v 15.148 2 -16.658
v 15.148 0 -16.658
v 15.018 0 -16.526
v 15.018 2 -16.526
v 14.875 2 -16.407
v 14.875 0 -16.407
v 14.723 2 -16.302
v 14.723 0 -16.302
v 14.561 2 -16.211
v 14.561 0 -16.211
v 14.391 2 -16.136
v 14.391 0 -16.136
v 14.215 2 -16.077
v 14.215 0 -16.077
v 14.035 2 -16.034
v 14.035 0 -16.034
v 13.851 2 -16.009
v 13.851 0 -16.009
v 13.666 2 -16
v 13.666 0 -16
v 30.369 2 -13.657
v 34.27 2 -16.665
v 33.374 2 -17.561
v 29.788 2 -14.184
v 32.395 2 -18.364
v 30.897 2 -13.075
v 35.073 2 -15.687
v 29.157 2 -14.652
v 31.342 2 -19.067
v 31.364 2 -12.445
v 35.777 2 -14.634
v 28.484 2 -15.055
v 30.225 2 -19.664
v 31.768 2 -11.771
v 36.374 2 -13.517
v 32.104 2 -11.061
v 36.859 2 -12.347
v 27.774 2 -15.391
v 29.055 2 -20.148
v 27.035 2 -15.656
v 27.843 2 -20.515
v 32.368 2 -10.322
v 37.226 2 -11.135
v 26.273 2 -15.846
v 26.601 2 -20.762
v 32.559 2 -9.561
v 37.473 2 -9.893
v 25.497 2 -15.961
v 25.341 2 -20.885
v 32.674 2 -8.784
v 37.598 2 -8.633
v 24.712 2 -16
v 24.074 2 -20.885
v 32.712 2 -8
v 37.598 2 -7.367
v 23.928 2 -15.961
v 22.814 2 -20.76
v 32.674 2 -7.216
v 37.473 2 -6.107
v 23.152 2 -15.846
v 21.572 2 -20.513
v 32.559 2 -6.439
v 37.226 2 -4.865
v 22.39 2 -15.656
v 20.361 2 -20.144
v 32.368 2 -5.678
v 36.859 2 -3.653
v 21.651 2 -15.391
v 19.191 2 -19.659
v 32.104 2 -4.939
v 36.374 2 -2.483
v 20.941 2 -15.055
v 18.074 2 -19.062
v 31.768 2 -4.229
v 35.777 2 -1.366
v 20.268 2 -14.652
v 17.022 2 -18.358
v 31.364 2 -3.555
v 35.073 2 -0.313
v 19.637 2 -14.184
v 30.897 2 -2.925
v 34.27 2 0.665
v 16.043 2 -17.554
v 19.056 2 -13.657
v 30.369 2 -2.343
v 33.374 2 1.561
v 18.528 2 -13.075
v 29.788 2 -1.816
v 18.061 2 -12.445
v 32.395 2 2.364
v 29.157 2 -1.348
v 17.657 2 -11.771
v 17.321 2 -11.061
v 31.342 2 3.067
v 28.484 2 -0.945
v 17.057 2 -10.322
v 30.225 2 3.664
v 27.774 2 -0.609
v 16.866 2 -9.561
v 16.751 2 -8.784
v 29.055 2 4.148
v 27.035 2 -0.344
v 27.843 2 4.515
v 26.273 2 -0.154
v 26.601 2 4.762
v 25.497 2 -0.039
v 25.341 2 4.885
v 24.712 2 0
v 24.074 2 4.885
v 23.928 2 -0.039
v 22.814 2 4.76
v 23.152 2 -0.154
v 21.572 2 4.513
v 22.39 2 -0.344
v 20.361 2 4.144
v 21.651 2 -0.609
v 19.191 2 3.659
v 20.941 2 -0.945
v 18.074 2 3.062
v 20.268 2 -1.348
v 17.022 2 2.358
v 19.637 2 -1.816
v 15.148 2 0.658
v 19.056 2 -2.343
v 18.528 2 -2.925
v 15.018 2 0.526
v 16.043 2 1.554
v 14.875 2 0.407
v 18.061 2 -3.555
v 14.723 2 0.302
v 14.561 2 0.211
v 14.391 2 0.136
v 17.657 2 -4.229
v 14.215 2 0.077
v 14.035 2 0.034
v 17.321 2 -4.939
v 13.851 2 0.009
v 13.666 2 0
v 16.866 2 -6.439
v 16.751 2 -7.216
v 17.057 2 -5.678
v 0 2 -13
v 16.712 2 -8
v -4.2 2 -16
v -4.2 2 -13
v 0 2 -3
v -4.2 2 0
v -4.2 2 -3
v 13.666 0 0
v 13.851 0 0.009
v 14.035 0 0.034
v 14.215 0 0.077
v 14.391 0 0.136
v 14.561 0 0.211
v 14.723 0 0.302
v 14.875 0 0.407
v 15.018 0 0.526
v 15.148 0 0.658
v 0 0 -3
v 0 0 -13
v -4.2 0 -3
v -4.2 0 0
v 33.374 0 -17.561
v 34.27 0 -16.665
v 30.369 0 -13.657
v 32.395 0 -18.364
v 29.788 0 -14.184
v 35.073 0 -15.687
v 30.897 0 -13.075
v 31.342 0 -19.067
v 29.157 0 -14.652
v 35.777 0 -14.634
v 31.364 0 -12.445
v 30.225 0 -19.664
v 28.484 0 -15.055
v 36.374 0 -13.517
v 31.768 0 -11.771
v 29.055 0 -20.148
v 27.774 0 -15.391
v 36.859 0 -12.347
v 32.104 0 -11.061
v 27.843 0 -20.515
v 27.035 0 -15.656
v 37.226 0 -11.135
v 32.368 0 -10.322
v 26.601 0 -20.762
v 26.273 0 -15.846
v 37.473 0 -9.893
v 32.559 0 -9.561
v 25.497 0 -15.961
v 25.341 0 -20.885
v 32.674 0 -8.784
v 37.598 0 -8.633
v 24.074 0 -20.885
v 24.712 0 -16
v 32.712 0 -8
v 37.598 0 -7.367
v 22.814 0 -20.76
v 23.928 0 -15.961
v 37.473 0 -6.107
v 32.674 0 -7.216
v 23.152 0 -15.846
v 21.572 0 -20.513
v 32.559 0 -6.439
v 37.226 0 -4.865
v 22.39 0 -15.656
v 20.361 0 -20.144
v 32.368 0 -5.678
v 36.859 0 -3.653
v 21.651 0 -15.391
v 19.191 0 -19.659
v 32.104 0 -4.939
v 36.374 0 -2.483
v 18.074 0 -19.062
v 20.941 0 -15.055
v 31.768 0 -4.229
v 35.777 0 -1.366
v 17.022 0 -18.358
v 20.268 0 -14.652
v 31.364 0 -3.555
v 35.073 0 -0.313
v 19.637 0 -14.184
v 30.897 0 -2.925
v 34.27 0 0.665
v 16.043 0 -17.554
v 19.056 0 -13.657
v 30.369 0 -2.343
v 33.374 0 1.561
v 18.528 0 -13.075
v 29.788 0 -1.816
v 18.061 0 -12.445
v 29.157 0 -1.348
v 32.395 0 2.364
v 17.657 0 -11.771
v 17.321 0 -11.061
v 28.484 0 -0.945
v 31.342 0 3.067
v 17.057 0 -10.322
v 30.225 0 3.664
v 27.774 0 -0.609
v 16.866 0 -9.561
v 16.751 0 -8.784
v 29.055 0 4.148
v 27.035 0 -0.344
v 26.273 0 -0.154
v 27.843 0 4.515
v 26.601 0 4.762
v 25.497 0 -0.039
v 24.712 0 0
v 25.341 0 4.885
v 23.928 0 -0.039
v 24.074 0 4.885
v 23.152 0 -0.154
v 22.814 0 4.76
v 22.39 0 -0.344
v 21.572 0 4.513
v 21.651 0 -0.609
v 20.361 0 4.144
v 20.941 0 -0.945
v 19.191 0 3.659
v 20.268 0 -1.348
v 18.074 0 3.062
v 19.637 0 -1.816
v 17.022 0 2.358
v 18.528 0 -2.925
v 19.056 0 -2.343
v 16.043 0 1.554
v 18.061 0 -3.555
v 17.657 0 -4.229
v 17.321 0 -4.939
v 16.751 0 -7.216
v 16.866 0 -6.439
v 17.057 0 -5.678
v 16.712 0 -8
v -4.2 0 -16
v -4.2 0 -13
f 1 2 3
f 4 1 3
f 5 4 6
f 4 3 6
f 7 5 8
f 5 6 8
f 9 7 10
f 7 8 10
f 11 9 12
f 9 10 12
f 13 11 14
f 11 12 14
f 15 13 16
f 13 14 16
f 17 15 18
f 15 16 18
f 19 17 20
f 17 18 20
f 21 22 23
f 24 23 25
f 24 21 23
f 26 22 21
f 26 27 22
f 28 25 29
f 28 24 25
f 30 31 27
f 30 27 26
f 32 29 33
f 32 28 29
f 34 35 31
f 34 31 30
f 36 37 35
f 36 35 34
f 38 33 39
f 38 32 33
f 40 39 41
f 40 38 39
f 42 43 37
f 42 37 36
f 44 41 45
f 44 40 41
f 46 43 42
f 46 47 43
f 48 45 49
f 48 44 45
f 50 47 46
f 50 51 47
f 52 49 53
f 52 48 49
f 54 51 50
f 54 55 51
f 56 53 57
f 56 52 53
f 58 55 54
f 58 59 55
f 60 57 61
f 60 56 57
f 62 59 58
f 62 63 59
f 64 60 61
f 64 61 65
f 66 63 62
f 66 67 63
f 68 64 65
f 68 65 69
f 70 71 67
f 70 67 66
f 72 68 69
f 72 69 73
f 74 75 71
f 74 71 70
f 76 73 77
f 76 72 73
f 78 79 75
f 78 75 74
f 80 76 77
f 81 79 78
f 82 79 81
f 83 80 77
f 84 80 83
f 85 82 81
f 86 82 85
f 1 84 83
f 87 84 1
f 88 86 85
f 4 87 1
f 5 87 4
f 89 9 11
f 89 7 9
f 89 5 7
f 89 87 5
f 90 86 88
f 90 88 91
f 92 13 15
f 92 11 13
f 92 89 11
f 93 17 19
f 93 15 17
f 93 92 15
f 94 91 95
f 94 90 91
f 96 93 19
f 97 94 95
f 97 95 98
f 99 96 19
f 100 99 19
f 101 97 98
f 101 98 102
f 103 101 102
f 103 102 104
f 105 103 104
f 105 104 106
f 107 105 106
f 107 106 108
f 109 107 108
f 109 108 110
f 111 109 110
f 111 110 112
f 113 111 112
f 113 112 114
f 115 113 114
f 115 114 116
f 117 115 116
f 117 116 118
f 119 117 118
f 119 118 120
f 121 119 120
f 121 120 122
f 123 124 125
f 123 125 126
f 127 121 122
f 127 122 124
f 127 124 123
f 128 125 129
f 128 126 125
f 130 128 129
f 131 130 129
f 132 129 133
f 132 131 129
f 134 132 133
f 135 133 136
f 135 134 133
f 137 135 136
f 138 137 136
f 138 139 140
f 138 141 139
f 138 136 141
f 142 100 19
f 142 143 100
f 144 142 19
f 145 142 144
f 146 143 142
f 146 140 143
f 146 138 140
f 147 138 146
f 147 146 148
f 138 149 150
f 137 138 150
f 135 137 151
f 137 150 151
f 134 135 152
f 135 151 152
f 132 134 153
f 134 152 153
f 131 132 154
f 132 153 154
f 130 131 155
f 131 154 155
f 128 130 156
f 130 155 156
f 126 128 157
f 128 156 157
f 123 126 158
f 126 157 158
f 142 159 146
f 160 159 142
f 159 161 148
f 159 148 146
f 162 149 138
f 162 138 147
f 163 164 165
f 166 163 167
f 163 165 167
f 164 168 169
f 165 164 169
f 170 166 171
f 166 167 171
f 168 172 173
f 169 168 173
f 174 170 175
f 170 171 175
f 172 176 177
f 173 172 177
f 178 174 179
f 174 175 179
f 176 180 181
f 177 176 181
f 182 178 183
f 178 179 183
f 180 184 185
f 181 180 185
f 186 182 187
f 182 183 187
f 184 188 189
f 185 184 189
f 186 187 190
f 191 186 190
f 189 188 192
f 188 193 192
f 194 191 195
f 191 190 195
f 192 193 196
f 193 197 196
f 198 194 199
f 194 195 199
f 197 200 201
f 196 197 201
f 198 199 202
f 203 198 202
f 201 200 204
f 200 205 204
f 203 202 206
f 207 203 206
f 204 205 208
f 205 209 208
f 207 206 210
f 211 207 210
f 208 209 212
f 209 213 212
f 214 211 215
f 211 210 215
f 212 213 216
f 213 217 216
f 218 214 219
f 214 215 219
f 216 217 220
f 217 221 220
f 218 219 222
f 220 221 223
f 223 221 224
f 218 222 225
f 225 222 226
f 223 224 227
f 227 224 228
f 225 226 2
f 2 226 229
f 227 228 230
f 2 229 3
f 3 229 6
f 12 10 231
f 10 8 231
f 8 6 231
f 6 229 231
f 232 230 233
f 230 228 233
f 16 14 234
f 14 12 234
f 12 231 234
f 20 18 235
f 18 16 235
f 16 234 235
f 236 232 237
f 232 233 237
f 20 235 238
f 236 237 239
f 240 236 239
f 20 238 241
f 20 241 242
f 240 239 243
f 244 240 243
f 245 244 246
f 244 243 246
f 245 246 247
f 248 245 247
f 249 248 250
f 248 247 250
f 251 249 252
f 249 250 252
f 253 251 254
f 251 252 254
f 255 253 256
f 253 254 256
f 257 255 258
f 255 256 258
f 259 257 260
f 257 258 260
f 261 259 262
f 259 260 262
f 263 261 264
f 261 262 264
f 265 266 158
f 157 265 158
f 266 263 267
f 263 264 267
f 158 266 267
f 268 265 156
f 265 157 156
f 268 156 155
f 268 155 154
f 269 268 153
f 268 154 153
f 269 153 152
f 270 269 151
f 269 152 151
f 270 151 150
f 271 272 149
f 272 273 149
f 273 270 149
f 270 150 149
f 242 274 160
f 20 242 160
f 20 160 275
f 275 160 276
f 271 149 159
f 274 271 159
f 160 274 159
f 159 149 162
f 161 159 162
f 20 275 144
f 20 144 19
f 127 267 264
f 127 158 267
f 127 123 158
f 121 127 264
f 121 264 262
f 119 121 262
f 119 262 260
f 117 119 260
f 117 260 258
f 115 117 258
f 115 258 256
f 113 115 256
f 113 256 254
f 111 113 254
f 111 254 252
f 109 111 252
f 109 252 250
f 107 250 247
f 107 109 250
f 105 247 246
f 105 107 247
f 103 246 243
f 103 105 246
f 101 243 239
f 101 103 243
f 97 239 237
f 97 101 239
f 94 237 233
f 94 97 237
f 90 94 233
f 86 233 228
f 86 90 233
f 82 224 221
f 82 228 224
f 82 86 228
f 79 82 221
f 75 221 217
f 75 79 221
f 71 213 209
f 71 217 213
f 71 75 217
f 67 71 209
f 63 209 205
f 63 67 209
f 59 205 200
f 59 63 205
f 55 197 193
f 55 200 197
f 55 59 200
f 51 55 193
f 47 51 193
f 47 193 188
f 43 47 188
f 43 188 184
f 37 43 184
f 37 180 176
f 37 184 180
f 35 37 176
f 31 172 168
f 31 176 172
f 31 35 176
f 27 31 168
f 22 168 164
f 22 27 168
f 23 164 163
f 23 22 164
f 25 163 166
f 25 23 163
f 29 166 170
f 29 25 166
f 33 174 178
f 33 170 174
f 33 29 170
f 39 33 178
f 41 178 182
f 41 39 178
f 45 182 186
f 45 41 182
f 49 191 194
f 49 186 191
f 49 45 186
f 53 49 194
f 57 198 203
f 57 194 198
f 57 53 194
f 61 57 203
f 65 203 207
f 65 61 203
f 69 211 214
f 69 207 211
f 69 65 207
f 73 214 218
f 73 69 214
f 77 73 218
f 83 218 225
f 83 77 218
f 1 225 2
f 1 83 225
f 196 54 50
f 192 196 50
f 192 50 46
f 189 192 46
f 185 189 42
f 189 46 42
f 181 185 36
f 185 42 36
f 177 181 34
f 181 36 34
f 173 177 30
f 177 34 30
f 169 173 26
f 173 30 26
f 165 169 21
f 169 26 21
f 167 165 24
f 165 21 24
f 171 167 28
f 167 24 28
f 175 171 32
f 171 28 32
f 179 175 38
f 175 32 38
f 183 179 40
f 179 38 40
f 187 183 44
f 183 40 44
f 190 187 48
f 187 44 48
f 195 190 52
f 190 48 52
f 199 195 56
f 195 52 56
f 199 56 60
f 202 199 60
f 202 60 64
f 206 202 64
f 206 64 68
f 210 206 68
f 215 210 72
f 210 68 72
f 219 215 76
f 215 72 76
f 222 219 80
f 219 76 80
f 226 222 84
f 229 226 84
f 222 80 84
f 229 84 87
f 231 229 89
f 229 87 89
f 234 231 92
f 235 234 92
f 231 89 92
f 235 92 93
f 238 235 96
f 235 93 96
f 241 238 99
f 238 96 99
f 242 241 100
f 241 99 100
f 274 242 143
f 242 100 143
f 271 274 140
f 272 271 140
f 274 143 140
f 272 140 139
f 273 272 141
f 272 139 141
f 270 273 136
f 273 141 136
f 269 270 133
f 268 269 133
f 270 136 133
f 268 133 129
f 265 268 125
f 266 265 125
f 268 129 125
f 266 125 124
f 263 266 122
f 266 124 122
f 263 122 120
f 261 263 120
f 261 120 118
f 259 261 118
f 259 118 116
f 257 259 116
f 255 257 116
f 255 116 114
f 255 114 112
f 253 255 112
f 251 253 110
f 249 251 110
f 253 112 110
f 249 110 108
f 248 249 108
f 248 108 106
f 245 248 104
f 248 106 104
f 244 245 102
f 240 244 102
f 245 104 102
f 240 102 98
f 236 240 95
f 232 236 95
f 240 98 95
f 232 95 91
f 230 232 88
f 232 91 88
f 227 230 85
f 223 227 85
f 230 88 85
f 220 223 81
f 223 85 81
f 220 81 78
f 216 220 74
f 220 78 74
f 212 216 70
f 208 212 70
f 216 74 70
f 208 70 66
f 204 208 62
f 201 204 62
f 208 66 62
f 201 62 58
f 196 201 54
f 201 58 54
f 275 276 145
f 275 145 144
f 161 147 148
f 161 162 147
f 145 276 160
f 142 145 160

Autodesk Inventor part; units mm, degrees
ref_plane "YZ Plane" through (0, 0, 0) normal (1, 0, 0) x (0, 1, 0)
ref_plane "XZ Plane" through (0, 0, 0) normal (0, 1, 0) x (-1, 0, 0)
ref_plane "XY Plane" through (0, 0, 0) normal (0, 0, 1) x (1, 0, 0)
sketch "Эскиз1" plane through (0, 0, 0) normal (0, 1, 0) x (-1, 0, 0)
  line L0 (0, 0) -> (4.2, 0)
  line L1 (4.2, 0) -> (4.2, -3)
  line L2 (4.2, -3) -> (0, -3)
  line L3 (0, -3) -> (0, -13)
  line L4 (4.2, -13) -> (0, -13)
  line L5 (4.2, -13) -> (4.2, -16)
  line L6 (4.2, -16) -> (0, -16)
  line L7 (0, -16) -> (-9.7125, -16)
  line L8 (-9.7125, -16) -> (-9.7125, 0)
  line L9 (-9.7125, 0) -> (4.2, 0)
  dimension "d0" = 4.2
  dimension "d1" = 10
  dimension "d2" = 3
  dimension "d3" = 3
extrude "Выдавливание1" add sketch "Эскиз1" along normal blind 2
sketch "Эскиз2" plane through (0, 2, 0) normal (0, 1, 0) x (1, 0, 0)
  line L0 (9.7125, 0) -> (9.7125, 16) projected
  line L1 (9.7125, 8) -> (24.7125, 8)
  circle A0 centre (24.7125, 8) radius 12.9007
  circle A1 centre (24.7125, 8) radius 8
  line L2 (9.7125, 16) -> (-4.2, 16) projected
  line L3 (9.7125, 16) -> (14.5918, 16)
  line L4 (-4.2, 0) -> (9.7125, 0) projected
  line L5 (9.7125, 0) -> (14.5918, 0)
  point P0 (0, 0)
  dimension "d6" = 15
extrude "Выдавливание2" add sketch "Эскиз2" against normal blind 2
fillet "Сопряжение1" radius 2 2 edges at (14.5918, 1, -16) (14.5918, 1, 0)
properties part number "kkekey"
